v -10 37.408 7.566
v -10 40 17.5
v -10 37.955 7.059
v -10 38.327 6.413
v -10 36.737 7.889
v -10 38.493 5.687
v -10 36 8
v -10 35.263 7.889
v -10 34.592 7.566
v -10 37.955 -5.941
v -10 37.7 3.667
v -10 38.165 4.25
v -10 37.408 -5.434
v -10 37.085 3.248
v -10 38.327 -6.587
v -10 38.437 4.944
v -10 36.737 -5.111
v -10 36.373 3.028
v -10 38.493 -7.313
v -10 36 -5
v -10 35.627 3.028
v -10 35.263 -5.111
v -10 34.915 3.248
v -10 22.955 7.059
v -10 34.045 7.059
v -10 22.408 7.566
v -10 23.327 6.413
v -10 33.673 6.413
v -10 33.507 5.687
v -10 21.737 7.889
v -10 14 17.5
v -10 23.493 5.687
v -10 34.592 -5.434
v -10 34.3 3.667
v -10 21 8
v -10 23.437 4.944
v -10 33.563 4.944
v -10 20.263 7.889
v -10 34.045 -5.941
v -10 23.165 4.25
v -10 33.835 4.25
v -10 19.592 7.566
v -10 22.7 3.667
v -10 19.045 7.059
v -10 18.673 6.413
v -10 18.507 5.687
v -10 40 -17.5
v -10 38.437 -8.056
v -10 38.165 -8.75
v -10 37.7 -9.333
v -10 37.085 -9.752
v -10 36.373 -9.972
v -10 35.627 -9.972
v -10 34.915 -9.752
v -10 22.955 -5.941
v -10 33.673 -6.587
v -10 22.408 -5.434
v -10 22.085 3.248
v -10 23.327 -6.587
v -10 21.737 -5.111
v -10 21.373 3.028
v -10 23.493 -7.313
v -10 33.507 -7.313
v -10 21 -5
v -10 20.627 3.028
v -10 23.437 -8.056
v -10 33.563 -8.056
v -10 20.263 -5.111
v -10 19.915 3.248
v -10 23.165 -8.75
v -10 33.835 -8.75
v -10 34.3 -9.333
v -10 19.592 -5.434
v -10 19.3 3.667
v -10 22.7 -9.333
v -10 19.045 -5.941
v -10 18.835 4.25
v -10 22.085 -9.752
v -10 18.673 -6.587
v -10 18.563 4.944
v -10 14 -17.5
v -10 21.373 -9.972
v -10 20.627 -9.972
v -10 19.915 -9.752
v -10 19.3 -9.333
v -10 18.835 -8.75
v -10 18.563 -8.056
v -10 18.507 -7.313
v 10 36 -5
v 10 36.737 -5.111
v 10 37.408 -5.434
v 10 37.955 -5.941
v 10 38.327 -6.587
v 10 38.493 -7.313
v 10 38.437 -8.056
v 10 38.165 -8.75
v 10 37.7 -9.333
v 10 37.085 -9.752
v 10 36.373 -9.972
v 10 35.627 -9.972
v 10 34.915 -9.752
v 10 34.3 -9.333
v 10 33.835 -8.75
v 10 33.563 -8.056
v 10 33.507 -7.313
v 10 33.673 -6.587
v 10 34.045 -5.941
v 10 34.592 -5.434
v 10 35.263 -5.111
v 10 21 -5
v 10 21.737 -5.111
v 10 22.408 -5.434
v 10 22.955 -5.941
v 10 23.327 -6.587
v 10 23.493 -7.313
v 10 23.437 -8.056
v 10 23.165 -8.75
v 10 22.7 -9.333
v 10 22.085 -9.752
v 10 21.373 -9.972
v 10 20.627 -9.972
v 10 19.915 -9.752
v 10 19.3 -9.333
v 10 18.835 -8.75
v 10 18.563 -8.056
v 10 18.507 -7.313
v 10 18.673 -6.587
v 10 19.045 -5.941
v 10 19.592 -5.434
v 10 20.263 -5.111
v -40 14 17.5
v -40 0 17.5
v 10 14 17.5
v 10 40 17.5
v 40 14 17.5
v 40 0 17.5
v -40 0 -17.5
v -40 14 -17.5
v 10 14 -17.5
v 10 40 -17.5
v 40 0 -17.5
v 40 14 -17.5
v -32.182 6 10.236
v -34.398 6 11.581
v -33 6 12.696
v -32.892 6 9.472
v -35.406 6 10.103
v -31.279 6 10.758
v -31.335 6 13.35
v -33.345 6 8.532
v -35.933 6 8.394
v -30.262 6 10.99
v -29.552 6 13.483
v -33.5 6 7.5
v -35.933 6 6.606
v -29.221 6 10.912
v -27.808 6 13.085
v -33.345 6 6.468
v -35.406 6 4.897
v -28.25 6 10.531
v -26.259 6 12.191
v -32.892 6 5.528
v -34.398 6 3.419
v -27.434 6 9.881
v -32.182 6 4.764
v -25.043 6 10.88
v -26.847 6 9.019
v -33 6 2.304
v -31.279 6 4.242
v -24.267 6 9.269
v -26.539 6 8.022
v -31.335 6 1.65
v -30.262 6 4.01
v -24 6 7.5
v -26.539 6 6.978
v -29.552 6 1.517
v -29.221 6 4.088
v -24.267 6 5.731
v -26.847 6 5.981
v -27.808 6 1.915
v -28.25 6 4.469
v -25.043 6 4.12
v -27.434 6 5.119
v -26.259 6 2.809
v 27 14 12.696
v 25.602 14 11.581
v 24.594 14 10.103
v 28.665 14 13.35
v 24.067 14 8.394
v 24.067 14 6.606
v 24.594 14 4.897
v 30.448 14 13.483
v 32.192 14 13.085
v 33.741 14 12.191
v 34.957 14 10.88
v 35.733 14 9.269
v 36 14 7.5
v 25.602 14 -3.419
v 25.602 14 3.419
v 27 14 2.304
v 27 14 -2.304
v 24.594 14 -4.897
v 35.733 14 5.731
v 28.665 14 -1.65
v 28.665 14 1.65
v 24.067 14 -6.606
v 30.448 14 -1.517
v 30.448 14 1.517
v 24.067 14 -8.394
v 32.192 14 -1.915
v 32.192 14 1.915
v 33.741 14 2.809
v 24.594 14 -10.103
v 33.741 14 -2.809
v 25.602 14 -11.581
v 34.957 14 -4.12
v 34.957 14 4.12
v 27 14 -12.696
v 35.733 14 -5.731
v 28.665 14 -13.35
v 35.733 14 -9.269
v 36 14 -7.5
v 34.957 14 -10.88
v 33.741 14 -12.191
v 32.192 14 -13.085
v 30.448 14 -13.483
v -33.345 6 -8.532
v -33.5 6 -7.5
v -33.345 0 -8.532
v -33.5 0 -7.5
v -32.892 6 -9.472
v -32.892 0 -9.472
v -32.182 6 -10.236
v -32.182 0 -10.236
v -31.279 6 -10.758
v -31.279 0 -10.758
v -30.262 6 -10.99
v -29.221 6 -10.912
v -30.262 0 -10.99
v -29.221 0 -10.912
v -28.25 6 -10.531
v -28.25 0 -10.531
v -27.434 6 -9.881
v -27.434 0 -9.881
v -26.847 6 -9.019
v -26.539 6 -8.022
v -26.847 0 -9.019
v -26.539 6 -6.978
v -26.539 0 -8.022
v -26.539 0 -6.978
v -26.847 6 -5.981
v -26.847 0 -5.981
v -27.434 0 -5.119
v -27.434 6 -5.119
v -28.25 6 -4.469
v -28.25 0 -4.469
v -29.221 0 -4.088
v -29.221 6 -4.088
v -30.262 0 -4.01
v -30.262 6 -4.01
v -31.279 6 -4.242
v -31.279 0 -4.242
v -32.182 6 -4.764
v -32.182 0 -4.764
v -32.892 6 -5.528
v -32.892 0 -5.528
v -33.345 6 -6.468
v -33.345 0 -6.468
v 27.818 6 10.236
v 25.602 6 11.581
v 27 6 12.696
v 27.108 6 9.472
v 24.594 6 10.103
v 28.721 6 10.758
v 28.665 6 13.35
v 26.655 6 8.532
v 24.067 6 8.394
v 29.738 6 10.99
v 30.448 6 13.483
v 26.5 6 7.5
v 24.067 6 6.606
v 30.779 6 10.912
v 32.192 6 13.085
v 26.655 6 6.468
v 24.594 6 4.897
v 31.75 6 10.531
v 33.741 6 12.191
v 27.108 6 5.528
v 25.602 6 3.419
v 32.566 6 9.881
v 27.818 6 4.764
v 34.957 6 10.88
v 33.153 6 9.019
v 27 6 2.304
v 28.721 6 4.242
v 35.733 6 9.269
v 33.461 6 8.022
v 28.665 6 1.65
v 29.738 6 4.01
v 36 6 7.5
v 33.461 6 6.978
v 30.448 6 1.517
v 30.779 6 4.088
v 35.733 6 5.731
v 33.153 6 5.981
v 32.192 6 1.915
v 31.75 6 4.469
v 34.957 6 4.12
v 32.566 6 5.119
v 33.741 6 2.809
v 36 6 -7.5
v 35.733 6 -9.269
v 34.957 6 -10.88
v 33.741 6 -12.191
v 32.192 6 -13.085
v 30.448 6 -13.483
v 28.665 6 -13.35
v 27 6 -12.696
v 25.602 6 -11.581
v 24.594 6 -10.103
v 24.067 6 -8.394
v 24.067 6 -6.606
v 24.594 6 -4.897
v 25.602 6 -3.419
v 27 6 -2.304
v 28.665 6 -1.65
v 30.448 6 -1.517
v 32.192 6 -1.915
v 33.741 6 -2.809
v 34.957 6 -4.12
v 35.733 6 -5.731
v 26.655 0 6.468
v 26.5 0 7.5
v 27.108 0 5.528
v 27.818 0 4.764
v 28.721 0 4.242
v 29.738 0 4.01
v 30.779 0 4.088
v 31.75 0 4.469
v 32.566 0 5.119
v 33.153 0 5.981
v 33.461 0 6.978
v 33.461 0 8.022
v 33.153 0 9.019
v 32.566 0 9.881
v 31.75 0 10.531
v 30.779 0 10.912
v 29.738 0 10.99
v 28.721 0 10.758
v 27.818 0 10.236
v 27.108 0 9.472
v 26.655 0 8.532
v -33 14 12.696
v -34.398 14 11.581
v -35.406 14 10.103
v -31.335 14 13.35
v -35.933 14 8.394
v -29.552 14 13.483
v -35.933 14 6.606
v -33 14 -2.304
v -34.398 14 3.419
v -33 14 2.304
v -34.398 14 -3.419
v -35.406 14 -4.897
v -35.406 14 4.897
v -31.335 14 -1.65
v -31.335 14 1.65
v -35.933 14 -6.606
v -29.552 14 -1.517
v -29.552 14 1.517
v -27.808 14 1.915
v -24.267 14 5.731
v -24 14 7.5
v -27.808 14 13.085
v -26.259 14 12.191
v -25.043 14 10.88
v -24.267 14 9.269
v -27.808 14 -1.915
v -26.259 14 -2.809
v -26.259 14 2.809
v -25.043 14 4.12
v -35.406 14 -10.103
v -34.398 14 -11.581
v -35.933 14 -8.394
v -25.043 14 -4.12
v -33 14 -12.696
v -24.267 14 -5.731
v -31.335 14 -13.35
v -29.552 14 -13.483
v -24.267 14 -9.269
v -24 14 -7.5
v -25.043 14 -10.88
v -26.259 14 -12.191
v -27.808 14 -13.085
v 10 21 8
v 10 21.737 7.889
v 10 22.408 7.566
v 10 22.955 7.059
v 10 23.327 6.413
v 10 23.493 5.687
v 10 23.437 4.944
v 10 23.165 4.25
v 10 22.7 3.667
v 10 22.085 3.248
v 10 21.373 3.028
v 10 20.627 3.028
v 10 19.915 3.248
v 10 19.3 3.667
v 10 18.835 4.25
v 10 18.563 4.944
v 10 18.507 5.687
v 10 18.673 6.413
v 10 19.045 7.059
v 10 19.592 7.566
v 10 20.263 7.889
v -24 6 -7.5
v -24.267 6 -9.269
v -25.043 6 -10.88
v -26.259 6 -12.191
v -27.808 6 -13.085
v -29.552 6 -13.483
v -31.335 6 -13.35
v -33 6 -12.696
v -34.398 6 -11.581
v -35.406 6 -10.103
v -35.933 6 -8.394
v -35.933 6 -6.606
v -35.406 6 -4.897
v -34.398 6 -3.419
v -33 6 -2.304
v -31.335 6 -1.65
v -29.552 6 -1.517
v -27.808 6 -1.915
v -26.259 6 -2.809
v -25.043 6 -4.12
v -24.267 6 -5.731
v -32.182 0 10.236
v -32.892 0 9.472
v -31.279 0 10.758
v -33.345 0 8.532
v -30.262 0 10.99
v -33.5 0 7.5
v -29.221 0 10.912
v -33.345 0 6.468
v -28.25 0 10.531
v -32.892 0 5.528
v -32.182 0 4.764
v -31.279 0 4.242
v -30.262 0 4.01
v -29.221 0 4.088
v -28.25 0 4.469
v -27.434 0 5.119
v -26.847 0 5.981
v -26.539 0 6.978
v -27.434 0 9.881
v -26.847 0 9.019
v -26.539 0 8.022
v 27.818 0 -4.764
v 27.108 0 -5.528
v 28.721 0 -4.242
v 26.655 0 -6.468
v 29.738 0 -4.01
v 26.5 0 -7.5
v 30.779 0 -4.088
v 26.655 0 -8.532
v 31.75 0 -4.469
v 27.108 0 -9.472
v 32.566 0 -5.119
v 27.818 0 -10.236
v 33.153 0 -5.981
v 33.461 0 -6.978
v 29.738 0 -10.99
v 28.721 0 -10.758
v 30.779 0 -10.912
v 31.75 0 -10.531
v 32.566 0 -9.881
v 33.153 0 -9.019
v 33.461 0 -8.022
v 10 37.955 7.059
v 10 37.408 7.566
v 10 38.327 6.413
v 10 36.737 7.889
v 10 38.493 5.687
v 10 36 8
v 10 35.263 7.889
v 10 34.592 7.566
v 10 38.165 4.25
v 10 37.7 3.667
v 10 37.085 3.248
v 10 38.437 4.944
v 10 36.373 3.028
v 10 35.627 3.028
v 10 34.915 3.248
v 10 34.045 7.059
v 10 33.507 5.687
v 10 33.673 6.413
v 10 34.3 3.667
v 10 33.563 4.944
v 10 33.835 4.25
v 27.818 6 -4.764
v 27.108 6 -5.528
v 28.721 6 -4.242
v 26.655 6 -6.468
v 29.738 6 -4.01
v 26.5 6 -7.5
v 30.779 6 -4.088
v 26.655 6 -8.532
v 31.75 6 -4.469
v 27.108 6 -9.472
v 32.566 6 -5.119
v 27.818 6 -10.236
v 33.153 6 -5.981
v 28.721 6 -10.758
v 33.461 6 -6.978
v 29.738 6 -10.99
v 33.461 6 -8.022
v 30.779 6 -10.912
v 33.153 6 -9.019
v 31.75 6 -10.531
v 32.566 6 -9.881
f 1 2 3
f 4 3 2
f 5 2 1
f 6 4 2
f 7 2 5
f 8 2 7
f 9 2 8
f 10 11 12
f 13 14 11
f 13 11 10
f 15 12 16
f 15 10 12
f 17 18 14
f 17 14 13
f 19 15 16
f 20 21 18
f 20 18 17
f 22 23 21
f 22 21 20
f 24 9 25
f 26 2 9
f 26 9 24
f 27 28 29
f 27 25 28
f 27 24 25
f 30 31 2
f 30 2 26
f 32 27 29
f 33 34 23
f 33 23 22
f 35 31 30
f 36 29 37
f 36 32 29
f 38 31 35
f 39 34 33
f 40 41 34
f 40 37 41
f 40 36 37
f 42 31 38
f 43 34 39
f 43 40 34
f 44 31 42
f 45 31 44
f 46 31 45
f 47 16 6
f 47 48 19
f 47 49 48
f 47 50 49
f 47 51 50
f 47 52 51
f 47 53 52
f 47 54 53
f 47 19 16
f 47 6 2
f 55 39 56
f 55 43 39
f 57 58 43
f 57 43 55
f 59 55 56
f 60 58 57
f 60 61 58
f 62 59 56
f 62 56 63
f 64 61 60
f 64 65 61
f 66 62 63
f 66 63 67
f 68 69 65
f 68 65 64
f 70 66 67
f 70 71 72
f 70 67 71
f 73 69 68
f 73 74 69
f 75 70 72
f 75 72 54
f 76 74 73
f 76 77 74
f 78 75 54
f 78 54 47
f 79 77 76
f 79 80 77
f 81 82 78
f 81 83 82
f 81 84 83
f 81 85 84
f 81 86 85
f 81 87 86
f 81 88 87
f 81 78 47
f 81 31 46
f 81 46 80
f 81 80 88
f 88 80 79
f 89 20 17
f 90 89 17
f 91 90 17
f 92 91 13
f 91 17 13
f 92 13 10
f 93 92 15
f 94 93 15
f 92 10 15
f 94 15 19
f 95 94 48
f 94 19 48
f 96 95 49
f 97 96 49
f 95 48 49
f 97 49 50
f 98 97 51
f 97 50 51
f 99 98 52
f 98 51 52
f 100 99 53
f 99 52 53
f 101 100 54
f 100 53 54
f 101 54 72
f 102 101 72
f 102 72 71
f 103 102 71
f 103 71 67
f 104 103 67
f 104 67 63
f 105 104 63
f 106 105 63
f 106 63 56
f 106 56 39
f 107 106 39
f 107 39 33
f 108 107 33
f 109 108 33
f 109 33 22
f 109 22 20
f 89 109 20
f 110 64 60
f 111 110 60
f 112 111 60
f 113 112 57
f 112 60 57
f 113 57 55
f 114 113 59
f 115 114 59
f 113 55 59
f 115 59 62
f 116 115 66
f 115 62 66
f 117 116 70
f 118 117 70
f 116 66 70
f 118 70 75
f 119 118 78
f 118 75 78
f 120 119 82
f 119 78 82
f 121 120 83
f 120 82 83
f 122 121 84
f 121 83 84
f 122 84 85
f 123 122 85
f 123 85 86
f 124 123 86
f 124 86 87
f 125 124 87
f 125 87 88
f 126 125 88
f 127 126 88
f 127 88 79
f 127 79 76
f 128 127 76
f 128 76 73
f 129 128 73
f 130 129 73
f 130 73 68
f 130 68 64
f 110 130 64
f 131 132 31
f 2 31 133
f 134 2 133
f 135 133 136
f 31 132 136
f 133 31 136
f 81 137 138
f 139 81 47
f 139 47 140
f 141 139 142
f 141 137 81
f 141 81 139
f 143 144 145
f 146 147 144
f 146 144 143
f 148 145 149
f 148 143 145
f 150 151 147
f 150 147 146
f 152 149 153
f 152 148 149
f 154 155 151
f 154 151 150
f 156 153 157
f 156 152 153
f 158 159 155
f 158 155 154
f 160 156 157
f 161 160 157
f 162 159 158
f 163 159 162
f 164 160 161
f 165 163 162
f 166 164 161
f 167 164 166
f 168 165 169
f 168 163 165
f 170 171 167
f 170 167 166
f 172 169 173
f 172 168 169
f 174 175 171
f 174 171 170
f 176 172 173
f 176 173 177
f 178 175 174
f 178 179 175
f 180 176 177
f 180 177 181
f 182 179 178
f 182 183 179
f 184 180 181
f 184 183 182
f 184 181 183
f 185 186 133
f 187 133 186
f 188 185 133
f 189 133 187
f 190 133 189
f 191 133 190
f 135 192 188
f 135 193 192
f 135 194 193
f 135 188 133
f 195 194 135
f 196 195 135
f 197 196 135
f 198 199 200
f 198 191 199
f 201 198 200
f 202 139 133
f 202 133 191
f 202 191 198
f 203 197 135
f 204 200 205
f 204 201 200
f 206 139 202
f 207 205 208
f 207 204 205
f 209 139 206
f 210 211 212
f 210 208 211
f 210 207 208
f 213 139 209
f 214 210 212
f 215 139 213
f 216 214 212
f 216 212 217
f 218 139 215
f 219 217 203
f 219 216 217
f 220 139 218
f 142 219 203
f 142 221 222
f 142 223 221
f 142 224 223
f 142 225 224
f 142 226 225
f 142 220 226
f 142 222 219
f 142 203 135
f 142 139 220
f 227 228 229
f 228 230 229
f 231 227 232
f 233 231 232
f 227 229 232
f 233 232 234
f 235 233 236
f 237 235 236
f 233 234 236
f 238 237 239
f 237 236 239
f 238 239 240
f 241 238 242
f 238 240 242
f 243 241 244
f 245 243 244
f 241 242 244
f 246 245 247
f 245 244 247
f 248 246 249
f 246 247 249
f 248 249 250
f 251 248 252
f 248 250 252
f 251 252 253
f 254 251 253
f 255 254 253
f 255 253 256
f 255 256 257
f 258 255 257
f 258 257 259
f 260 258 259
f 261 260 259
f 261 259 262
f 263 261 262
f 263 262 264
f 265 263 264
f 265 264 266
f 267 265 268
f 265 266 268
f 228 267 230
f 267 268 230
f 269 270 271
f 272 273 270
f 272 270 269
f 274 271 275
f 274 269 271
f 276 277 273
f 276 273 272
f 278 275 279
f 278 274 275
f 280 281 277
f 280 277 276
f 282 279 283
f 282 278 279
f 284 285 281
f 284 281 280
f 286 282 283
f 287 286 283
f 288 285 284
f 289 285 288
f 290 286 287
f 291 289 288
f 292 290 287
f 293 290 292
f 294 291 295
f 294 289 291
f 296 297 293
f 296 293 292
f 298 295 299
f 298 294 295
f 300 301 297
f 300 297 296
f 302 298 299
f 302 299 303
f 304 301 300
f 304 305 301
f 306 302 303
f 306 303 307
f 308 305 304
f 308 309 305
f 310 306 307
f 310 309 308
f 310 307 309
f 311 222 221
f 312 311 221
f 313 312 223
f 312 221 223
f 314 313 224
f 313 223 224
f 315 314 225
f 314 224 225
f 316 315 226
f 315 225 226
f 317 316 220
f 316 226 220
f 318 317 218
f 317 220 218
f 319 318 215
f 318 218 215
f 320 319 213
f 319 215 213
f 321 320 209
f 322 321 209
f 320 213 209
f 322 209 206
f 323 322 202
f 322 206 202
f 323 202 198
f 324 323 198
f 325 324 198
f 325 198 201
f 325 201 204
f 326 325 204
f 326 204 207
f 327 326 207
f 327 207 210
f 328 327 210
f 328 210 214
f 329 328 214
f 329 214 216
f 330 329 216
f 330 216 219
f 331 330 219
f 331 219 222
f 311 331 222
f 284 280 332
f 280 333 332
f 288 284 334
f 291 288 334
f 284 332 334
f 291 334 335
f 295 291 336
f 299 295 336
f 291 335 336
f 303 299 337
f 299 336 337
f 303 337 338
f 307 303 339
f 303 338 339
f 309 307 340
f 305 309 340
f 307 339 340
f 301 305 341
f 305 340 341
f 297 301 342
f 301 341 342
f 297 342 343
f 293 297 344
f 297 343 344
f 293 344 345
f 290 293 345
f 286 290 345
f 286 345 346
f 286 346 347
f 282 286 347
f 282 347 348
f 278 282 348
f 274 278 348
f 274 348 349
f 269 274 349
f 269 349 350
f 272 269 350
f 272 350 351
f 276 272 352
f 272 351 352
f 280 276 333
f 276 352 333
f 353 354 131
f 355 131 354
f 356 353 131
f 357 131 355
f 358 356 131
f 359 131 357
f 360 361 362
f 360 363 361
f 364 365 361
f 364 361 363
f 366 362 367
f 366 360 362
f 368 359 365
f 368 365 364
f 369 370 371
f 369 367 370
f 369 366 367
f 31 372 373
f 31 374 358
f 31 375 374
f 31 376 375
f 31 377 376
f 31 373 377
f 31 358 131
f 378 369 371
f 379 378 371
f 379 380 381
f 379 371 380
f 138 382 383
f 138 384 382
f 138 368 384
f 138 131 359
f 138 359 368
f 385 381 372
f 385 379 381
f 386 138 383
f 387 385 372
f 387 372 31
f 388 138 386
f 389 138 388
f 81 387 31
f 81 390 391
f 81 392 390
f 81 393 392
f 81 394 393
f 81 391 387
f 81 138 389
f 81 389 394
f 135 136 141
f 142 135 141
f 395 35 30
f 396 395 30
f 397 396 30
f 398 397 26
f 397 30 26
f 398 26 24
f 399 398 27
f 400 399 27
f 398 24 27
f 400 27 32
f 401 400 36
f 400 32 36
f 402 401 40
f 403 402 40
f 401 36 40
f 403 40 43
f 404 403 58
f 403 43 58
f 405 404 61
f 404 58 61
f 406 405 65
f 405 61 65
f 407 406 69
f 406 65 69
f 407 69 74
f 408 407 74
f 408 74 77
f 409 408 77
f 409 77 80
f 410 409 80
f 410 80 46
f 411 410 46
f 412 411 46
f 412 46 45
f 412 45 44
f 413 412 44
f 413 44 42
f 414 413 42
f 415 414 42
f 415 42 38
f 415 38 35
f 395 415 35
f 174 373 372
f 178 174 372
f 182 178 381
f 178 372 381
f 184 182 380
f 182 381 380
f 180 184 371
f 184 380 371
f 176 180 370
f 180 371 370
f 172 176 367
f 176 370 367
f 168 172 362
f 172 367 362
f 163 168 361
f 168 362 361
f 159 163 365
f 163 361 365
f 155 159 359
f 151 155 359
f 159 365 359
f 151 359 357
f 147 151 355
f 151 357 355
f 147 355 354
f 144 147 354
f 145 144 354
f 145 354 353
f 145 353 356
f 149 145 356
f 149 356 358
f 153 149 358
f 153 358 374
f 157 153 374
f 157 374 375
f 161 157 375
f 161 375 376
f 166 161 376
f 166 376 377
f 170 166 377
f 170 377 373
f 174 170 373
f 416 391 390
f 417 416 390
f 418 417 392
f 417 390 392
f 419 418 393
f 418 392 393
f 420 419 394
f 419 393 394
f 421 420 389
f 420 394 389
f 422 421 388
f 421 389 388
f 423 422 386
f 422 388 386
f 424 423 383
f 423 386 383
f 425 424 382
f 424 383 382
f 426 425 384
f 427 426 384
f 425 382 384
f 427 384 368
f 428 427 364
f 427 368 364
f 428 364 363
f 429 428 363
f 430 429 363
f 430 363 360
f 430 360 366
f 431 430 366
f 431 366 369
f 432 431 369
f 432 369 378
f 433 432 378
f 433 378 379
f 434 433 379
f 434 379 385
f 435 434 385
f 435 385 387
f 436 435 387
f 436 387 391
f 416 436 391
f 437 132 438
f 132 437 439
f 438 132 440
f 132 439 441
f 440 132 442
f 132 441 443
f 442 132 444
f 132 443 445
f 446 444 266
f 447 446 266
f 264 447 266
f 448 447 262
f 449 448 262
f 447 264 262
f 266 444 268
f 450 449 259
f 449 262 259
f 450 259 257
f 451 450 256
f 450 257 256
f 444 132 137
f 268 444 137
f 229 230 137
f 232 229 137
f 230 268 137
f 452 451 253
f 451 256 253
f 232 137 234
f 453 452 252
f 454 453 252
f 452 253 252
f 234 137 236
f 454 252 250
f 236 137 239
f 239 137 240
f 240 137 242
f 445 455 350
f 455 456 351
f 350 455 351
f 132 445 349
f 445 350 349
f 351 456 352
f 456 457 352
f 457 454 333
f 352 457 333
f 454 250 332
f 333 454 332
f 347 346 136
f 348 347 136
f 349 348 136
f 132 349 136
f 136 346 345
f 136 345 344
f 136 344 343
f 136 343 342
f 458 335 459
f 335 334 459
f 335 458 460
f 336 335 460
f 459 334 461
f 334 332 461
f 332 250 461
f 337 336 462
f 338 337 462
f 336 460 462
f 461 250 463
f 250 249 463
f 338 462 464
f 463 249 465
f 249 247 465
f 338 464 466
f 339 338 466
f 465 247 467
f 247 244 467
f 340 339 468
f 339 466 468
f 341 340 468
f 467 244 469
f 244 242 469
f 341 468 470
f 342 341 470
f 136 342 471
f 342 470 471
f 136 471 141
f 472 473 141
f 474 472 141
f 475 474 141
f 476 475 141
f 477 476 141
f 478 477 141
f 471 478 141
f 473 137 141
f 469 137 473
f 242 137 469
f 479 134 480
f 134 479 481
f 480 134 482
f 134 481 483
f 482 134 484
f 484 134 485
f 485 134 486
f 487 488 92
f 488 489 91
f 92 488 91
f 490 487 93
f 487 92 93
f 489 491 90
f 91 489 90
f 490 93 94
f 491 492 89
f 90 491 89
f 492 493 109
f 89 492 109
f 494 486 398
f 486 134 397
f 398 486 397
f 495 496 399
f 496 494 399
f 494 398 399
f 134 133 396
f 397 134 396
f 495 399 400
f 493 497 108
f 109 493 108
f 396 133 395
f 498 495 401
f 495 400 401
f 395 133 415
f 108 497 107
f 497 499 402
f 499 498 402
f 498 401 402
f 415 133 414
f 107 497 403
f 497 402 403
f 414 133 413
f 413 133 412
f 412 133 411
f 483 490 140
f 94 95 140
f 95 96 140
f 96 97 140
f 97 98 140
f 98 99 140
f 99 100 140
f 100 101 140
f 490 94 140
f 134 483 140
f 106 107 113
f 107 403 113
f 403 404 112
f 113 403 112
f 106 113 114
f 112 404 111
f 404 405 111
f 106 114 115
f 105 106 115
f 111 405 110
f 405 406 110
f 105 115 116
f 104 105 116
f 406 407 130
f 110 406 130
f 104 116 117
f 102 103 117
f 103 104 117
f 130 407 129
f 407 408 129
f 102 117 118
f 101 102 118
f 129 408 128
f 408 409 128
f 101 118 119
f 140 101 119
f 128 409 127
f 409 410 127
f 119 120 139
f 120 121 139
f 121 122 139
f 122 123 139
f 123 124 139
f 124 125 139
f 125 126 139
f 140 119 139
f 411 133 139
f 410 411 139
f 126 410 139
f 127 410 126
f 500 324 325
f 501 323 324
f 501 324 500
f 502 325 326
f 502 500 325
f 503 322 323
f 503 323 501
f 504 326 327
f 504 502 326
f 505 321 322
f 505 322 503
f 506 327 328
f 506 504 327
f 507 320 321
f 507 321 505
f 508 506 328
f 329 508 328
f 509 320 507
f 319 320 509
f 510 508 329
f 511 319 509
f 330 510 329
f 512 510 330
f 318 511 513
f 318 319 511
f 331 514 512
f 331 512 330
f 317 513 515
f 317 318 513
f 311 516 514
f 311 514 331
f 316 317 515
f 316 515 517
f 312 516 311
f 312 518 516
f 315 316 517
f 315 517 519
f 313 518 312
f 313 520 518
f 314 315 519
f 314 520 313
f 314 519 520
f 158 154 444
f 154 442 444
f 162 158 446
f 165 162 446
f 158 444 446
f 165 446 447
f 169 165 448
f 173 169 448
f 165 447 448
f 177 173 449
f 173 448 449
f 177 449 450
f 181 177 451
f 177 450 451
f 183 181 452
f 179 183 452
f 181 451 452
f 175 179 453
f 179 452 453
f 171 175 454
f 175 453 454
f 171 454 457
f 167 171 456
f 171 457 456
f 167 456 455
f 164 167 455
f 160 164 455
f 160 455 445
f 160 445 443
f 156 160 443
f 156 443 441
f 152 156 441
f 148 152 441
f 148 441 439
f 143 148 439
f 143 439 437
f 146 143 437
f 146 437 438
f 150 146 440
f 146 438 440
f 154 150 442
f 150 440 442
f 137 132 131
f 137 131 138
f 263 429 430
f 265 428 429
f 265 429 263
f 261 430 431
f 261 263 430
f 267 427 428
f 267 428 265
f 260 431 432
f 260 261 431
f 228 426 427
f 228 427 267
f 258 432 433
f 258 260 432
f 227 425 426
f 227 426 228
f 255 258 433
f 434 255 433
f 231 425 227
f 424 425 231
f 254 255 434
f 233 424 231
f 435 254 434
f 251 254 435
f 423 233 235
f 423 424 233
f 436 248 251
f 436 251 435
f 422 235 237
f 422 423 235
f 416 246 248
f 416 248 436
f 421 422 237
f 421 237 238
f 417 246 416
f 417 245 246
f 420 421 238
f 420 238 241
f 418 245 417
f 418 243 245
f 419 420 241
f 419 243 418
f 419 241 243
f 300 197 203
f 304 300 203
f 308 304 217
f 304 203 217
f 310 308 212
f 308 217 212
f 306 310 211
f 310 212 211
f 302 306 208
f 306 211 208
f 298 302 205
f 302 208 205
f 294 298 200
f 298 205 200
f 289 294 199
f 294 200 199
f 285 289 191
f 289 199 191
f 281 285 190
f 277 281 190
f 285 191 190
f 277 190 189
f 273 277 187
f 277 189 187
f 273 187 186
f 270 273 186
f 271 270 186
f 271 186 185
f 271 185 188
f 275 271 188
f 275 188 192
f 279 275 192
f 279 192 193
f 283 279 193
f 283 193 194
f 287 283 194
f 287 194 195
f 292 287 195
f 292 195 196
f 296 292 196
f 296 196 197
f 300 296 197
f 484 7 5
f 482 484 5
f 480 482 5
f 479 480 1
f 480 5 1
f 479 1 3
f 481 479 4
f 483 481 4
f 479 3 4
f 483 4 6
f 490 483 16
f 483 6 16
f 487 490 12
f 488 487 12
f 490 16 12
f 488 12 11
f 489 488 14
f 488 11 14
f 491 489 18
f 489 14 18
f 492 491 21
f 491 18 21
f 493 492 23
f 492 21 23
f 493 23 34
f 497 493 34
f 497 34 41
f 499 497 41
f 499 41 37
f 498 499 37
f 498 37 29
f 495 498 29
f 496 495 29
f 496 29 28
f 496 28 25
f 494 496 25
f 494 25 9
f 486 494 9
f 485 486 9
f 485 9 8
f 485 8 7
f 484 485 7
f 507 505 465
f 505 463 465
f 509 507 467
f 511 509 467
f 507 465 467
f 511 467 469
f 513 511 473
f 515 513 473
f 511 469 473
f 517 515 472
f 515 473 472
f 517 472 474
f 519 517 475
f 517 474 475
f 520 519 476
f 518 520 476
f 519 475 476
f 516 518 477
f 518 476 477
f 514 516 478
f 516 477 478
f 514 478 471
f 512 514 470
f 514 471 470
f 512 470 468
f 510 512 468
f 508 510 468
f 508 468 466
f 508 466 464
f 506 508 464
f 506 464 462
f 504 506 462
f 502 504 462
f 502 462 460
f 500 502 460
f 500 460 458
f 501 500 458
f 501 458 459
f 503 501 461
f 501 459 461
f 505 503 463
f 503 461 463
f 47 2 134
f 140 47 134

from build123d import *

# Parameters (mm, degrees)
SKETCH_1_W                    = 80
SKETCH_1_H                    = 35
EXTRUDE_1_DEPTH               = 14
SKETCH_2_W                    = 20
SKETCH_2_H                    = 35
EXTRUDE_2_DEPTH               = 26
HOLE_WIZARD_M20_1_D           = 7
HOLE_WIZARD_M20_1_CBORE_D     = 12
HOLE_WIZARD_M20_1_CBORE_DEPTH = 8
PATTERN_LINEAR_1_COUNT        = 2
PATTERN_LINEAR_1_PITCH        = 60
PATTERN_LINEAR_1_COUNT_DIR2   = 2
PATTERN_LINEAR_1_PITCH_DIR2   = 15
SKETCH_5_R                    = 2.5
CUT_EXTRUDE_1_DEPTH           = 67.379590237
PATTERN_LINEAR_2_COUNT        = 2
PATTERN_LINEAR_2_PITCH        = 13
PATTERN_LINEAR_2_COUNT_DIR2   = 2
PATTERN_LINEAR_2_PITCH_DIR2   = 15


with BuildPart() as part:
    # 草图1 → 凸台-拉伸1 (new body)
    with BuildSketch(Plane(origin=(0, 0, 0), x_dir=(1, 0, 0), z_dir=(0, 1, 0))):
        Rectangle(SKETCH_1_W, SKETCH_1_H)
    extrude(amount=EXTRUDE_1_DEPTH)

    # 草图2 → 凸台-拉伸2 (add)
    with BuildSketch(Plane(origin=(0, 14, 0), x_dir=(1, 0, 0), z_dir=(0, 1, 0))):
        Rectangle(SKETCH_2_W, SKETCH_2_H)
    extrude(amount=EXTRUDE_2_DEPTH)

    # M20 六角头螺栓的柱形沉头孔1 (through all)
    with Locations(Plane(origin=(0, 14, 0), x_dir=(1, 0, 0), z_dir=(0, 1, 0))):
        with Locations((-30, 7.5)):
            hole_wizard_m20_1 = CounterBoreHole(HOLE_WIZARD_M20_1_D / 2, HOLE_WIZARD_M20_1_CBORE_D / 2, HOLE_WIZARD_M20_1_CBORE_DEPTH)

    # 阵列(线性)1: Hole Wizard M20 _1 2 × 2
    with Locations(*[(i * PATTERN_LINEAR_1_PITCH, 0, j * PATTERN_LINEAR_1_PITCH_DIR2) for i in range(PATTERN_LINEAR_1_COUNT) for j in range(PATTERN_LINEAR_1_COUNT_DIR2) if (i, j) != (0, 0)]):
        add(hole_wizard_m20_1, mode=Mode.SUBTRACT)

    # 草图5 → 切除-拉伸1 (cut, through all)
    with BuildSketch(Plane.ZY.offset(10)):
        with Locations((-7.5, 21)):
            Circle(SKETCH_5_R)
    cut_extrude_1 = extrude(amount=-CUT_EXTRUDE_1_DEPTH, mode=Mode.SUBTRACT)

    # 阵列(线性)2: Cut-Extrude 1 2 × 2
    with Locations(*[(0, j * PATTERN_LINEAR_2_PITCH_DIR2, i * PATTERN_LINEAR_2_PITCH) for i in range(PATTERN_LINEAR_2_COUNT) for j in range(PATTERN_LINEAR_2_COUNT_DIR2) if (i, j) != (0, 0)]):
        add(cut_extrude_1, mode=Mode.SUBTRACT)


solid = part.part
